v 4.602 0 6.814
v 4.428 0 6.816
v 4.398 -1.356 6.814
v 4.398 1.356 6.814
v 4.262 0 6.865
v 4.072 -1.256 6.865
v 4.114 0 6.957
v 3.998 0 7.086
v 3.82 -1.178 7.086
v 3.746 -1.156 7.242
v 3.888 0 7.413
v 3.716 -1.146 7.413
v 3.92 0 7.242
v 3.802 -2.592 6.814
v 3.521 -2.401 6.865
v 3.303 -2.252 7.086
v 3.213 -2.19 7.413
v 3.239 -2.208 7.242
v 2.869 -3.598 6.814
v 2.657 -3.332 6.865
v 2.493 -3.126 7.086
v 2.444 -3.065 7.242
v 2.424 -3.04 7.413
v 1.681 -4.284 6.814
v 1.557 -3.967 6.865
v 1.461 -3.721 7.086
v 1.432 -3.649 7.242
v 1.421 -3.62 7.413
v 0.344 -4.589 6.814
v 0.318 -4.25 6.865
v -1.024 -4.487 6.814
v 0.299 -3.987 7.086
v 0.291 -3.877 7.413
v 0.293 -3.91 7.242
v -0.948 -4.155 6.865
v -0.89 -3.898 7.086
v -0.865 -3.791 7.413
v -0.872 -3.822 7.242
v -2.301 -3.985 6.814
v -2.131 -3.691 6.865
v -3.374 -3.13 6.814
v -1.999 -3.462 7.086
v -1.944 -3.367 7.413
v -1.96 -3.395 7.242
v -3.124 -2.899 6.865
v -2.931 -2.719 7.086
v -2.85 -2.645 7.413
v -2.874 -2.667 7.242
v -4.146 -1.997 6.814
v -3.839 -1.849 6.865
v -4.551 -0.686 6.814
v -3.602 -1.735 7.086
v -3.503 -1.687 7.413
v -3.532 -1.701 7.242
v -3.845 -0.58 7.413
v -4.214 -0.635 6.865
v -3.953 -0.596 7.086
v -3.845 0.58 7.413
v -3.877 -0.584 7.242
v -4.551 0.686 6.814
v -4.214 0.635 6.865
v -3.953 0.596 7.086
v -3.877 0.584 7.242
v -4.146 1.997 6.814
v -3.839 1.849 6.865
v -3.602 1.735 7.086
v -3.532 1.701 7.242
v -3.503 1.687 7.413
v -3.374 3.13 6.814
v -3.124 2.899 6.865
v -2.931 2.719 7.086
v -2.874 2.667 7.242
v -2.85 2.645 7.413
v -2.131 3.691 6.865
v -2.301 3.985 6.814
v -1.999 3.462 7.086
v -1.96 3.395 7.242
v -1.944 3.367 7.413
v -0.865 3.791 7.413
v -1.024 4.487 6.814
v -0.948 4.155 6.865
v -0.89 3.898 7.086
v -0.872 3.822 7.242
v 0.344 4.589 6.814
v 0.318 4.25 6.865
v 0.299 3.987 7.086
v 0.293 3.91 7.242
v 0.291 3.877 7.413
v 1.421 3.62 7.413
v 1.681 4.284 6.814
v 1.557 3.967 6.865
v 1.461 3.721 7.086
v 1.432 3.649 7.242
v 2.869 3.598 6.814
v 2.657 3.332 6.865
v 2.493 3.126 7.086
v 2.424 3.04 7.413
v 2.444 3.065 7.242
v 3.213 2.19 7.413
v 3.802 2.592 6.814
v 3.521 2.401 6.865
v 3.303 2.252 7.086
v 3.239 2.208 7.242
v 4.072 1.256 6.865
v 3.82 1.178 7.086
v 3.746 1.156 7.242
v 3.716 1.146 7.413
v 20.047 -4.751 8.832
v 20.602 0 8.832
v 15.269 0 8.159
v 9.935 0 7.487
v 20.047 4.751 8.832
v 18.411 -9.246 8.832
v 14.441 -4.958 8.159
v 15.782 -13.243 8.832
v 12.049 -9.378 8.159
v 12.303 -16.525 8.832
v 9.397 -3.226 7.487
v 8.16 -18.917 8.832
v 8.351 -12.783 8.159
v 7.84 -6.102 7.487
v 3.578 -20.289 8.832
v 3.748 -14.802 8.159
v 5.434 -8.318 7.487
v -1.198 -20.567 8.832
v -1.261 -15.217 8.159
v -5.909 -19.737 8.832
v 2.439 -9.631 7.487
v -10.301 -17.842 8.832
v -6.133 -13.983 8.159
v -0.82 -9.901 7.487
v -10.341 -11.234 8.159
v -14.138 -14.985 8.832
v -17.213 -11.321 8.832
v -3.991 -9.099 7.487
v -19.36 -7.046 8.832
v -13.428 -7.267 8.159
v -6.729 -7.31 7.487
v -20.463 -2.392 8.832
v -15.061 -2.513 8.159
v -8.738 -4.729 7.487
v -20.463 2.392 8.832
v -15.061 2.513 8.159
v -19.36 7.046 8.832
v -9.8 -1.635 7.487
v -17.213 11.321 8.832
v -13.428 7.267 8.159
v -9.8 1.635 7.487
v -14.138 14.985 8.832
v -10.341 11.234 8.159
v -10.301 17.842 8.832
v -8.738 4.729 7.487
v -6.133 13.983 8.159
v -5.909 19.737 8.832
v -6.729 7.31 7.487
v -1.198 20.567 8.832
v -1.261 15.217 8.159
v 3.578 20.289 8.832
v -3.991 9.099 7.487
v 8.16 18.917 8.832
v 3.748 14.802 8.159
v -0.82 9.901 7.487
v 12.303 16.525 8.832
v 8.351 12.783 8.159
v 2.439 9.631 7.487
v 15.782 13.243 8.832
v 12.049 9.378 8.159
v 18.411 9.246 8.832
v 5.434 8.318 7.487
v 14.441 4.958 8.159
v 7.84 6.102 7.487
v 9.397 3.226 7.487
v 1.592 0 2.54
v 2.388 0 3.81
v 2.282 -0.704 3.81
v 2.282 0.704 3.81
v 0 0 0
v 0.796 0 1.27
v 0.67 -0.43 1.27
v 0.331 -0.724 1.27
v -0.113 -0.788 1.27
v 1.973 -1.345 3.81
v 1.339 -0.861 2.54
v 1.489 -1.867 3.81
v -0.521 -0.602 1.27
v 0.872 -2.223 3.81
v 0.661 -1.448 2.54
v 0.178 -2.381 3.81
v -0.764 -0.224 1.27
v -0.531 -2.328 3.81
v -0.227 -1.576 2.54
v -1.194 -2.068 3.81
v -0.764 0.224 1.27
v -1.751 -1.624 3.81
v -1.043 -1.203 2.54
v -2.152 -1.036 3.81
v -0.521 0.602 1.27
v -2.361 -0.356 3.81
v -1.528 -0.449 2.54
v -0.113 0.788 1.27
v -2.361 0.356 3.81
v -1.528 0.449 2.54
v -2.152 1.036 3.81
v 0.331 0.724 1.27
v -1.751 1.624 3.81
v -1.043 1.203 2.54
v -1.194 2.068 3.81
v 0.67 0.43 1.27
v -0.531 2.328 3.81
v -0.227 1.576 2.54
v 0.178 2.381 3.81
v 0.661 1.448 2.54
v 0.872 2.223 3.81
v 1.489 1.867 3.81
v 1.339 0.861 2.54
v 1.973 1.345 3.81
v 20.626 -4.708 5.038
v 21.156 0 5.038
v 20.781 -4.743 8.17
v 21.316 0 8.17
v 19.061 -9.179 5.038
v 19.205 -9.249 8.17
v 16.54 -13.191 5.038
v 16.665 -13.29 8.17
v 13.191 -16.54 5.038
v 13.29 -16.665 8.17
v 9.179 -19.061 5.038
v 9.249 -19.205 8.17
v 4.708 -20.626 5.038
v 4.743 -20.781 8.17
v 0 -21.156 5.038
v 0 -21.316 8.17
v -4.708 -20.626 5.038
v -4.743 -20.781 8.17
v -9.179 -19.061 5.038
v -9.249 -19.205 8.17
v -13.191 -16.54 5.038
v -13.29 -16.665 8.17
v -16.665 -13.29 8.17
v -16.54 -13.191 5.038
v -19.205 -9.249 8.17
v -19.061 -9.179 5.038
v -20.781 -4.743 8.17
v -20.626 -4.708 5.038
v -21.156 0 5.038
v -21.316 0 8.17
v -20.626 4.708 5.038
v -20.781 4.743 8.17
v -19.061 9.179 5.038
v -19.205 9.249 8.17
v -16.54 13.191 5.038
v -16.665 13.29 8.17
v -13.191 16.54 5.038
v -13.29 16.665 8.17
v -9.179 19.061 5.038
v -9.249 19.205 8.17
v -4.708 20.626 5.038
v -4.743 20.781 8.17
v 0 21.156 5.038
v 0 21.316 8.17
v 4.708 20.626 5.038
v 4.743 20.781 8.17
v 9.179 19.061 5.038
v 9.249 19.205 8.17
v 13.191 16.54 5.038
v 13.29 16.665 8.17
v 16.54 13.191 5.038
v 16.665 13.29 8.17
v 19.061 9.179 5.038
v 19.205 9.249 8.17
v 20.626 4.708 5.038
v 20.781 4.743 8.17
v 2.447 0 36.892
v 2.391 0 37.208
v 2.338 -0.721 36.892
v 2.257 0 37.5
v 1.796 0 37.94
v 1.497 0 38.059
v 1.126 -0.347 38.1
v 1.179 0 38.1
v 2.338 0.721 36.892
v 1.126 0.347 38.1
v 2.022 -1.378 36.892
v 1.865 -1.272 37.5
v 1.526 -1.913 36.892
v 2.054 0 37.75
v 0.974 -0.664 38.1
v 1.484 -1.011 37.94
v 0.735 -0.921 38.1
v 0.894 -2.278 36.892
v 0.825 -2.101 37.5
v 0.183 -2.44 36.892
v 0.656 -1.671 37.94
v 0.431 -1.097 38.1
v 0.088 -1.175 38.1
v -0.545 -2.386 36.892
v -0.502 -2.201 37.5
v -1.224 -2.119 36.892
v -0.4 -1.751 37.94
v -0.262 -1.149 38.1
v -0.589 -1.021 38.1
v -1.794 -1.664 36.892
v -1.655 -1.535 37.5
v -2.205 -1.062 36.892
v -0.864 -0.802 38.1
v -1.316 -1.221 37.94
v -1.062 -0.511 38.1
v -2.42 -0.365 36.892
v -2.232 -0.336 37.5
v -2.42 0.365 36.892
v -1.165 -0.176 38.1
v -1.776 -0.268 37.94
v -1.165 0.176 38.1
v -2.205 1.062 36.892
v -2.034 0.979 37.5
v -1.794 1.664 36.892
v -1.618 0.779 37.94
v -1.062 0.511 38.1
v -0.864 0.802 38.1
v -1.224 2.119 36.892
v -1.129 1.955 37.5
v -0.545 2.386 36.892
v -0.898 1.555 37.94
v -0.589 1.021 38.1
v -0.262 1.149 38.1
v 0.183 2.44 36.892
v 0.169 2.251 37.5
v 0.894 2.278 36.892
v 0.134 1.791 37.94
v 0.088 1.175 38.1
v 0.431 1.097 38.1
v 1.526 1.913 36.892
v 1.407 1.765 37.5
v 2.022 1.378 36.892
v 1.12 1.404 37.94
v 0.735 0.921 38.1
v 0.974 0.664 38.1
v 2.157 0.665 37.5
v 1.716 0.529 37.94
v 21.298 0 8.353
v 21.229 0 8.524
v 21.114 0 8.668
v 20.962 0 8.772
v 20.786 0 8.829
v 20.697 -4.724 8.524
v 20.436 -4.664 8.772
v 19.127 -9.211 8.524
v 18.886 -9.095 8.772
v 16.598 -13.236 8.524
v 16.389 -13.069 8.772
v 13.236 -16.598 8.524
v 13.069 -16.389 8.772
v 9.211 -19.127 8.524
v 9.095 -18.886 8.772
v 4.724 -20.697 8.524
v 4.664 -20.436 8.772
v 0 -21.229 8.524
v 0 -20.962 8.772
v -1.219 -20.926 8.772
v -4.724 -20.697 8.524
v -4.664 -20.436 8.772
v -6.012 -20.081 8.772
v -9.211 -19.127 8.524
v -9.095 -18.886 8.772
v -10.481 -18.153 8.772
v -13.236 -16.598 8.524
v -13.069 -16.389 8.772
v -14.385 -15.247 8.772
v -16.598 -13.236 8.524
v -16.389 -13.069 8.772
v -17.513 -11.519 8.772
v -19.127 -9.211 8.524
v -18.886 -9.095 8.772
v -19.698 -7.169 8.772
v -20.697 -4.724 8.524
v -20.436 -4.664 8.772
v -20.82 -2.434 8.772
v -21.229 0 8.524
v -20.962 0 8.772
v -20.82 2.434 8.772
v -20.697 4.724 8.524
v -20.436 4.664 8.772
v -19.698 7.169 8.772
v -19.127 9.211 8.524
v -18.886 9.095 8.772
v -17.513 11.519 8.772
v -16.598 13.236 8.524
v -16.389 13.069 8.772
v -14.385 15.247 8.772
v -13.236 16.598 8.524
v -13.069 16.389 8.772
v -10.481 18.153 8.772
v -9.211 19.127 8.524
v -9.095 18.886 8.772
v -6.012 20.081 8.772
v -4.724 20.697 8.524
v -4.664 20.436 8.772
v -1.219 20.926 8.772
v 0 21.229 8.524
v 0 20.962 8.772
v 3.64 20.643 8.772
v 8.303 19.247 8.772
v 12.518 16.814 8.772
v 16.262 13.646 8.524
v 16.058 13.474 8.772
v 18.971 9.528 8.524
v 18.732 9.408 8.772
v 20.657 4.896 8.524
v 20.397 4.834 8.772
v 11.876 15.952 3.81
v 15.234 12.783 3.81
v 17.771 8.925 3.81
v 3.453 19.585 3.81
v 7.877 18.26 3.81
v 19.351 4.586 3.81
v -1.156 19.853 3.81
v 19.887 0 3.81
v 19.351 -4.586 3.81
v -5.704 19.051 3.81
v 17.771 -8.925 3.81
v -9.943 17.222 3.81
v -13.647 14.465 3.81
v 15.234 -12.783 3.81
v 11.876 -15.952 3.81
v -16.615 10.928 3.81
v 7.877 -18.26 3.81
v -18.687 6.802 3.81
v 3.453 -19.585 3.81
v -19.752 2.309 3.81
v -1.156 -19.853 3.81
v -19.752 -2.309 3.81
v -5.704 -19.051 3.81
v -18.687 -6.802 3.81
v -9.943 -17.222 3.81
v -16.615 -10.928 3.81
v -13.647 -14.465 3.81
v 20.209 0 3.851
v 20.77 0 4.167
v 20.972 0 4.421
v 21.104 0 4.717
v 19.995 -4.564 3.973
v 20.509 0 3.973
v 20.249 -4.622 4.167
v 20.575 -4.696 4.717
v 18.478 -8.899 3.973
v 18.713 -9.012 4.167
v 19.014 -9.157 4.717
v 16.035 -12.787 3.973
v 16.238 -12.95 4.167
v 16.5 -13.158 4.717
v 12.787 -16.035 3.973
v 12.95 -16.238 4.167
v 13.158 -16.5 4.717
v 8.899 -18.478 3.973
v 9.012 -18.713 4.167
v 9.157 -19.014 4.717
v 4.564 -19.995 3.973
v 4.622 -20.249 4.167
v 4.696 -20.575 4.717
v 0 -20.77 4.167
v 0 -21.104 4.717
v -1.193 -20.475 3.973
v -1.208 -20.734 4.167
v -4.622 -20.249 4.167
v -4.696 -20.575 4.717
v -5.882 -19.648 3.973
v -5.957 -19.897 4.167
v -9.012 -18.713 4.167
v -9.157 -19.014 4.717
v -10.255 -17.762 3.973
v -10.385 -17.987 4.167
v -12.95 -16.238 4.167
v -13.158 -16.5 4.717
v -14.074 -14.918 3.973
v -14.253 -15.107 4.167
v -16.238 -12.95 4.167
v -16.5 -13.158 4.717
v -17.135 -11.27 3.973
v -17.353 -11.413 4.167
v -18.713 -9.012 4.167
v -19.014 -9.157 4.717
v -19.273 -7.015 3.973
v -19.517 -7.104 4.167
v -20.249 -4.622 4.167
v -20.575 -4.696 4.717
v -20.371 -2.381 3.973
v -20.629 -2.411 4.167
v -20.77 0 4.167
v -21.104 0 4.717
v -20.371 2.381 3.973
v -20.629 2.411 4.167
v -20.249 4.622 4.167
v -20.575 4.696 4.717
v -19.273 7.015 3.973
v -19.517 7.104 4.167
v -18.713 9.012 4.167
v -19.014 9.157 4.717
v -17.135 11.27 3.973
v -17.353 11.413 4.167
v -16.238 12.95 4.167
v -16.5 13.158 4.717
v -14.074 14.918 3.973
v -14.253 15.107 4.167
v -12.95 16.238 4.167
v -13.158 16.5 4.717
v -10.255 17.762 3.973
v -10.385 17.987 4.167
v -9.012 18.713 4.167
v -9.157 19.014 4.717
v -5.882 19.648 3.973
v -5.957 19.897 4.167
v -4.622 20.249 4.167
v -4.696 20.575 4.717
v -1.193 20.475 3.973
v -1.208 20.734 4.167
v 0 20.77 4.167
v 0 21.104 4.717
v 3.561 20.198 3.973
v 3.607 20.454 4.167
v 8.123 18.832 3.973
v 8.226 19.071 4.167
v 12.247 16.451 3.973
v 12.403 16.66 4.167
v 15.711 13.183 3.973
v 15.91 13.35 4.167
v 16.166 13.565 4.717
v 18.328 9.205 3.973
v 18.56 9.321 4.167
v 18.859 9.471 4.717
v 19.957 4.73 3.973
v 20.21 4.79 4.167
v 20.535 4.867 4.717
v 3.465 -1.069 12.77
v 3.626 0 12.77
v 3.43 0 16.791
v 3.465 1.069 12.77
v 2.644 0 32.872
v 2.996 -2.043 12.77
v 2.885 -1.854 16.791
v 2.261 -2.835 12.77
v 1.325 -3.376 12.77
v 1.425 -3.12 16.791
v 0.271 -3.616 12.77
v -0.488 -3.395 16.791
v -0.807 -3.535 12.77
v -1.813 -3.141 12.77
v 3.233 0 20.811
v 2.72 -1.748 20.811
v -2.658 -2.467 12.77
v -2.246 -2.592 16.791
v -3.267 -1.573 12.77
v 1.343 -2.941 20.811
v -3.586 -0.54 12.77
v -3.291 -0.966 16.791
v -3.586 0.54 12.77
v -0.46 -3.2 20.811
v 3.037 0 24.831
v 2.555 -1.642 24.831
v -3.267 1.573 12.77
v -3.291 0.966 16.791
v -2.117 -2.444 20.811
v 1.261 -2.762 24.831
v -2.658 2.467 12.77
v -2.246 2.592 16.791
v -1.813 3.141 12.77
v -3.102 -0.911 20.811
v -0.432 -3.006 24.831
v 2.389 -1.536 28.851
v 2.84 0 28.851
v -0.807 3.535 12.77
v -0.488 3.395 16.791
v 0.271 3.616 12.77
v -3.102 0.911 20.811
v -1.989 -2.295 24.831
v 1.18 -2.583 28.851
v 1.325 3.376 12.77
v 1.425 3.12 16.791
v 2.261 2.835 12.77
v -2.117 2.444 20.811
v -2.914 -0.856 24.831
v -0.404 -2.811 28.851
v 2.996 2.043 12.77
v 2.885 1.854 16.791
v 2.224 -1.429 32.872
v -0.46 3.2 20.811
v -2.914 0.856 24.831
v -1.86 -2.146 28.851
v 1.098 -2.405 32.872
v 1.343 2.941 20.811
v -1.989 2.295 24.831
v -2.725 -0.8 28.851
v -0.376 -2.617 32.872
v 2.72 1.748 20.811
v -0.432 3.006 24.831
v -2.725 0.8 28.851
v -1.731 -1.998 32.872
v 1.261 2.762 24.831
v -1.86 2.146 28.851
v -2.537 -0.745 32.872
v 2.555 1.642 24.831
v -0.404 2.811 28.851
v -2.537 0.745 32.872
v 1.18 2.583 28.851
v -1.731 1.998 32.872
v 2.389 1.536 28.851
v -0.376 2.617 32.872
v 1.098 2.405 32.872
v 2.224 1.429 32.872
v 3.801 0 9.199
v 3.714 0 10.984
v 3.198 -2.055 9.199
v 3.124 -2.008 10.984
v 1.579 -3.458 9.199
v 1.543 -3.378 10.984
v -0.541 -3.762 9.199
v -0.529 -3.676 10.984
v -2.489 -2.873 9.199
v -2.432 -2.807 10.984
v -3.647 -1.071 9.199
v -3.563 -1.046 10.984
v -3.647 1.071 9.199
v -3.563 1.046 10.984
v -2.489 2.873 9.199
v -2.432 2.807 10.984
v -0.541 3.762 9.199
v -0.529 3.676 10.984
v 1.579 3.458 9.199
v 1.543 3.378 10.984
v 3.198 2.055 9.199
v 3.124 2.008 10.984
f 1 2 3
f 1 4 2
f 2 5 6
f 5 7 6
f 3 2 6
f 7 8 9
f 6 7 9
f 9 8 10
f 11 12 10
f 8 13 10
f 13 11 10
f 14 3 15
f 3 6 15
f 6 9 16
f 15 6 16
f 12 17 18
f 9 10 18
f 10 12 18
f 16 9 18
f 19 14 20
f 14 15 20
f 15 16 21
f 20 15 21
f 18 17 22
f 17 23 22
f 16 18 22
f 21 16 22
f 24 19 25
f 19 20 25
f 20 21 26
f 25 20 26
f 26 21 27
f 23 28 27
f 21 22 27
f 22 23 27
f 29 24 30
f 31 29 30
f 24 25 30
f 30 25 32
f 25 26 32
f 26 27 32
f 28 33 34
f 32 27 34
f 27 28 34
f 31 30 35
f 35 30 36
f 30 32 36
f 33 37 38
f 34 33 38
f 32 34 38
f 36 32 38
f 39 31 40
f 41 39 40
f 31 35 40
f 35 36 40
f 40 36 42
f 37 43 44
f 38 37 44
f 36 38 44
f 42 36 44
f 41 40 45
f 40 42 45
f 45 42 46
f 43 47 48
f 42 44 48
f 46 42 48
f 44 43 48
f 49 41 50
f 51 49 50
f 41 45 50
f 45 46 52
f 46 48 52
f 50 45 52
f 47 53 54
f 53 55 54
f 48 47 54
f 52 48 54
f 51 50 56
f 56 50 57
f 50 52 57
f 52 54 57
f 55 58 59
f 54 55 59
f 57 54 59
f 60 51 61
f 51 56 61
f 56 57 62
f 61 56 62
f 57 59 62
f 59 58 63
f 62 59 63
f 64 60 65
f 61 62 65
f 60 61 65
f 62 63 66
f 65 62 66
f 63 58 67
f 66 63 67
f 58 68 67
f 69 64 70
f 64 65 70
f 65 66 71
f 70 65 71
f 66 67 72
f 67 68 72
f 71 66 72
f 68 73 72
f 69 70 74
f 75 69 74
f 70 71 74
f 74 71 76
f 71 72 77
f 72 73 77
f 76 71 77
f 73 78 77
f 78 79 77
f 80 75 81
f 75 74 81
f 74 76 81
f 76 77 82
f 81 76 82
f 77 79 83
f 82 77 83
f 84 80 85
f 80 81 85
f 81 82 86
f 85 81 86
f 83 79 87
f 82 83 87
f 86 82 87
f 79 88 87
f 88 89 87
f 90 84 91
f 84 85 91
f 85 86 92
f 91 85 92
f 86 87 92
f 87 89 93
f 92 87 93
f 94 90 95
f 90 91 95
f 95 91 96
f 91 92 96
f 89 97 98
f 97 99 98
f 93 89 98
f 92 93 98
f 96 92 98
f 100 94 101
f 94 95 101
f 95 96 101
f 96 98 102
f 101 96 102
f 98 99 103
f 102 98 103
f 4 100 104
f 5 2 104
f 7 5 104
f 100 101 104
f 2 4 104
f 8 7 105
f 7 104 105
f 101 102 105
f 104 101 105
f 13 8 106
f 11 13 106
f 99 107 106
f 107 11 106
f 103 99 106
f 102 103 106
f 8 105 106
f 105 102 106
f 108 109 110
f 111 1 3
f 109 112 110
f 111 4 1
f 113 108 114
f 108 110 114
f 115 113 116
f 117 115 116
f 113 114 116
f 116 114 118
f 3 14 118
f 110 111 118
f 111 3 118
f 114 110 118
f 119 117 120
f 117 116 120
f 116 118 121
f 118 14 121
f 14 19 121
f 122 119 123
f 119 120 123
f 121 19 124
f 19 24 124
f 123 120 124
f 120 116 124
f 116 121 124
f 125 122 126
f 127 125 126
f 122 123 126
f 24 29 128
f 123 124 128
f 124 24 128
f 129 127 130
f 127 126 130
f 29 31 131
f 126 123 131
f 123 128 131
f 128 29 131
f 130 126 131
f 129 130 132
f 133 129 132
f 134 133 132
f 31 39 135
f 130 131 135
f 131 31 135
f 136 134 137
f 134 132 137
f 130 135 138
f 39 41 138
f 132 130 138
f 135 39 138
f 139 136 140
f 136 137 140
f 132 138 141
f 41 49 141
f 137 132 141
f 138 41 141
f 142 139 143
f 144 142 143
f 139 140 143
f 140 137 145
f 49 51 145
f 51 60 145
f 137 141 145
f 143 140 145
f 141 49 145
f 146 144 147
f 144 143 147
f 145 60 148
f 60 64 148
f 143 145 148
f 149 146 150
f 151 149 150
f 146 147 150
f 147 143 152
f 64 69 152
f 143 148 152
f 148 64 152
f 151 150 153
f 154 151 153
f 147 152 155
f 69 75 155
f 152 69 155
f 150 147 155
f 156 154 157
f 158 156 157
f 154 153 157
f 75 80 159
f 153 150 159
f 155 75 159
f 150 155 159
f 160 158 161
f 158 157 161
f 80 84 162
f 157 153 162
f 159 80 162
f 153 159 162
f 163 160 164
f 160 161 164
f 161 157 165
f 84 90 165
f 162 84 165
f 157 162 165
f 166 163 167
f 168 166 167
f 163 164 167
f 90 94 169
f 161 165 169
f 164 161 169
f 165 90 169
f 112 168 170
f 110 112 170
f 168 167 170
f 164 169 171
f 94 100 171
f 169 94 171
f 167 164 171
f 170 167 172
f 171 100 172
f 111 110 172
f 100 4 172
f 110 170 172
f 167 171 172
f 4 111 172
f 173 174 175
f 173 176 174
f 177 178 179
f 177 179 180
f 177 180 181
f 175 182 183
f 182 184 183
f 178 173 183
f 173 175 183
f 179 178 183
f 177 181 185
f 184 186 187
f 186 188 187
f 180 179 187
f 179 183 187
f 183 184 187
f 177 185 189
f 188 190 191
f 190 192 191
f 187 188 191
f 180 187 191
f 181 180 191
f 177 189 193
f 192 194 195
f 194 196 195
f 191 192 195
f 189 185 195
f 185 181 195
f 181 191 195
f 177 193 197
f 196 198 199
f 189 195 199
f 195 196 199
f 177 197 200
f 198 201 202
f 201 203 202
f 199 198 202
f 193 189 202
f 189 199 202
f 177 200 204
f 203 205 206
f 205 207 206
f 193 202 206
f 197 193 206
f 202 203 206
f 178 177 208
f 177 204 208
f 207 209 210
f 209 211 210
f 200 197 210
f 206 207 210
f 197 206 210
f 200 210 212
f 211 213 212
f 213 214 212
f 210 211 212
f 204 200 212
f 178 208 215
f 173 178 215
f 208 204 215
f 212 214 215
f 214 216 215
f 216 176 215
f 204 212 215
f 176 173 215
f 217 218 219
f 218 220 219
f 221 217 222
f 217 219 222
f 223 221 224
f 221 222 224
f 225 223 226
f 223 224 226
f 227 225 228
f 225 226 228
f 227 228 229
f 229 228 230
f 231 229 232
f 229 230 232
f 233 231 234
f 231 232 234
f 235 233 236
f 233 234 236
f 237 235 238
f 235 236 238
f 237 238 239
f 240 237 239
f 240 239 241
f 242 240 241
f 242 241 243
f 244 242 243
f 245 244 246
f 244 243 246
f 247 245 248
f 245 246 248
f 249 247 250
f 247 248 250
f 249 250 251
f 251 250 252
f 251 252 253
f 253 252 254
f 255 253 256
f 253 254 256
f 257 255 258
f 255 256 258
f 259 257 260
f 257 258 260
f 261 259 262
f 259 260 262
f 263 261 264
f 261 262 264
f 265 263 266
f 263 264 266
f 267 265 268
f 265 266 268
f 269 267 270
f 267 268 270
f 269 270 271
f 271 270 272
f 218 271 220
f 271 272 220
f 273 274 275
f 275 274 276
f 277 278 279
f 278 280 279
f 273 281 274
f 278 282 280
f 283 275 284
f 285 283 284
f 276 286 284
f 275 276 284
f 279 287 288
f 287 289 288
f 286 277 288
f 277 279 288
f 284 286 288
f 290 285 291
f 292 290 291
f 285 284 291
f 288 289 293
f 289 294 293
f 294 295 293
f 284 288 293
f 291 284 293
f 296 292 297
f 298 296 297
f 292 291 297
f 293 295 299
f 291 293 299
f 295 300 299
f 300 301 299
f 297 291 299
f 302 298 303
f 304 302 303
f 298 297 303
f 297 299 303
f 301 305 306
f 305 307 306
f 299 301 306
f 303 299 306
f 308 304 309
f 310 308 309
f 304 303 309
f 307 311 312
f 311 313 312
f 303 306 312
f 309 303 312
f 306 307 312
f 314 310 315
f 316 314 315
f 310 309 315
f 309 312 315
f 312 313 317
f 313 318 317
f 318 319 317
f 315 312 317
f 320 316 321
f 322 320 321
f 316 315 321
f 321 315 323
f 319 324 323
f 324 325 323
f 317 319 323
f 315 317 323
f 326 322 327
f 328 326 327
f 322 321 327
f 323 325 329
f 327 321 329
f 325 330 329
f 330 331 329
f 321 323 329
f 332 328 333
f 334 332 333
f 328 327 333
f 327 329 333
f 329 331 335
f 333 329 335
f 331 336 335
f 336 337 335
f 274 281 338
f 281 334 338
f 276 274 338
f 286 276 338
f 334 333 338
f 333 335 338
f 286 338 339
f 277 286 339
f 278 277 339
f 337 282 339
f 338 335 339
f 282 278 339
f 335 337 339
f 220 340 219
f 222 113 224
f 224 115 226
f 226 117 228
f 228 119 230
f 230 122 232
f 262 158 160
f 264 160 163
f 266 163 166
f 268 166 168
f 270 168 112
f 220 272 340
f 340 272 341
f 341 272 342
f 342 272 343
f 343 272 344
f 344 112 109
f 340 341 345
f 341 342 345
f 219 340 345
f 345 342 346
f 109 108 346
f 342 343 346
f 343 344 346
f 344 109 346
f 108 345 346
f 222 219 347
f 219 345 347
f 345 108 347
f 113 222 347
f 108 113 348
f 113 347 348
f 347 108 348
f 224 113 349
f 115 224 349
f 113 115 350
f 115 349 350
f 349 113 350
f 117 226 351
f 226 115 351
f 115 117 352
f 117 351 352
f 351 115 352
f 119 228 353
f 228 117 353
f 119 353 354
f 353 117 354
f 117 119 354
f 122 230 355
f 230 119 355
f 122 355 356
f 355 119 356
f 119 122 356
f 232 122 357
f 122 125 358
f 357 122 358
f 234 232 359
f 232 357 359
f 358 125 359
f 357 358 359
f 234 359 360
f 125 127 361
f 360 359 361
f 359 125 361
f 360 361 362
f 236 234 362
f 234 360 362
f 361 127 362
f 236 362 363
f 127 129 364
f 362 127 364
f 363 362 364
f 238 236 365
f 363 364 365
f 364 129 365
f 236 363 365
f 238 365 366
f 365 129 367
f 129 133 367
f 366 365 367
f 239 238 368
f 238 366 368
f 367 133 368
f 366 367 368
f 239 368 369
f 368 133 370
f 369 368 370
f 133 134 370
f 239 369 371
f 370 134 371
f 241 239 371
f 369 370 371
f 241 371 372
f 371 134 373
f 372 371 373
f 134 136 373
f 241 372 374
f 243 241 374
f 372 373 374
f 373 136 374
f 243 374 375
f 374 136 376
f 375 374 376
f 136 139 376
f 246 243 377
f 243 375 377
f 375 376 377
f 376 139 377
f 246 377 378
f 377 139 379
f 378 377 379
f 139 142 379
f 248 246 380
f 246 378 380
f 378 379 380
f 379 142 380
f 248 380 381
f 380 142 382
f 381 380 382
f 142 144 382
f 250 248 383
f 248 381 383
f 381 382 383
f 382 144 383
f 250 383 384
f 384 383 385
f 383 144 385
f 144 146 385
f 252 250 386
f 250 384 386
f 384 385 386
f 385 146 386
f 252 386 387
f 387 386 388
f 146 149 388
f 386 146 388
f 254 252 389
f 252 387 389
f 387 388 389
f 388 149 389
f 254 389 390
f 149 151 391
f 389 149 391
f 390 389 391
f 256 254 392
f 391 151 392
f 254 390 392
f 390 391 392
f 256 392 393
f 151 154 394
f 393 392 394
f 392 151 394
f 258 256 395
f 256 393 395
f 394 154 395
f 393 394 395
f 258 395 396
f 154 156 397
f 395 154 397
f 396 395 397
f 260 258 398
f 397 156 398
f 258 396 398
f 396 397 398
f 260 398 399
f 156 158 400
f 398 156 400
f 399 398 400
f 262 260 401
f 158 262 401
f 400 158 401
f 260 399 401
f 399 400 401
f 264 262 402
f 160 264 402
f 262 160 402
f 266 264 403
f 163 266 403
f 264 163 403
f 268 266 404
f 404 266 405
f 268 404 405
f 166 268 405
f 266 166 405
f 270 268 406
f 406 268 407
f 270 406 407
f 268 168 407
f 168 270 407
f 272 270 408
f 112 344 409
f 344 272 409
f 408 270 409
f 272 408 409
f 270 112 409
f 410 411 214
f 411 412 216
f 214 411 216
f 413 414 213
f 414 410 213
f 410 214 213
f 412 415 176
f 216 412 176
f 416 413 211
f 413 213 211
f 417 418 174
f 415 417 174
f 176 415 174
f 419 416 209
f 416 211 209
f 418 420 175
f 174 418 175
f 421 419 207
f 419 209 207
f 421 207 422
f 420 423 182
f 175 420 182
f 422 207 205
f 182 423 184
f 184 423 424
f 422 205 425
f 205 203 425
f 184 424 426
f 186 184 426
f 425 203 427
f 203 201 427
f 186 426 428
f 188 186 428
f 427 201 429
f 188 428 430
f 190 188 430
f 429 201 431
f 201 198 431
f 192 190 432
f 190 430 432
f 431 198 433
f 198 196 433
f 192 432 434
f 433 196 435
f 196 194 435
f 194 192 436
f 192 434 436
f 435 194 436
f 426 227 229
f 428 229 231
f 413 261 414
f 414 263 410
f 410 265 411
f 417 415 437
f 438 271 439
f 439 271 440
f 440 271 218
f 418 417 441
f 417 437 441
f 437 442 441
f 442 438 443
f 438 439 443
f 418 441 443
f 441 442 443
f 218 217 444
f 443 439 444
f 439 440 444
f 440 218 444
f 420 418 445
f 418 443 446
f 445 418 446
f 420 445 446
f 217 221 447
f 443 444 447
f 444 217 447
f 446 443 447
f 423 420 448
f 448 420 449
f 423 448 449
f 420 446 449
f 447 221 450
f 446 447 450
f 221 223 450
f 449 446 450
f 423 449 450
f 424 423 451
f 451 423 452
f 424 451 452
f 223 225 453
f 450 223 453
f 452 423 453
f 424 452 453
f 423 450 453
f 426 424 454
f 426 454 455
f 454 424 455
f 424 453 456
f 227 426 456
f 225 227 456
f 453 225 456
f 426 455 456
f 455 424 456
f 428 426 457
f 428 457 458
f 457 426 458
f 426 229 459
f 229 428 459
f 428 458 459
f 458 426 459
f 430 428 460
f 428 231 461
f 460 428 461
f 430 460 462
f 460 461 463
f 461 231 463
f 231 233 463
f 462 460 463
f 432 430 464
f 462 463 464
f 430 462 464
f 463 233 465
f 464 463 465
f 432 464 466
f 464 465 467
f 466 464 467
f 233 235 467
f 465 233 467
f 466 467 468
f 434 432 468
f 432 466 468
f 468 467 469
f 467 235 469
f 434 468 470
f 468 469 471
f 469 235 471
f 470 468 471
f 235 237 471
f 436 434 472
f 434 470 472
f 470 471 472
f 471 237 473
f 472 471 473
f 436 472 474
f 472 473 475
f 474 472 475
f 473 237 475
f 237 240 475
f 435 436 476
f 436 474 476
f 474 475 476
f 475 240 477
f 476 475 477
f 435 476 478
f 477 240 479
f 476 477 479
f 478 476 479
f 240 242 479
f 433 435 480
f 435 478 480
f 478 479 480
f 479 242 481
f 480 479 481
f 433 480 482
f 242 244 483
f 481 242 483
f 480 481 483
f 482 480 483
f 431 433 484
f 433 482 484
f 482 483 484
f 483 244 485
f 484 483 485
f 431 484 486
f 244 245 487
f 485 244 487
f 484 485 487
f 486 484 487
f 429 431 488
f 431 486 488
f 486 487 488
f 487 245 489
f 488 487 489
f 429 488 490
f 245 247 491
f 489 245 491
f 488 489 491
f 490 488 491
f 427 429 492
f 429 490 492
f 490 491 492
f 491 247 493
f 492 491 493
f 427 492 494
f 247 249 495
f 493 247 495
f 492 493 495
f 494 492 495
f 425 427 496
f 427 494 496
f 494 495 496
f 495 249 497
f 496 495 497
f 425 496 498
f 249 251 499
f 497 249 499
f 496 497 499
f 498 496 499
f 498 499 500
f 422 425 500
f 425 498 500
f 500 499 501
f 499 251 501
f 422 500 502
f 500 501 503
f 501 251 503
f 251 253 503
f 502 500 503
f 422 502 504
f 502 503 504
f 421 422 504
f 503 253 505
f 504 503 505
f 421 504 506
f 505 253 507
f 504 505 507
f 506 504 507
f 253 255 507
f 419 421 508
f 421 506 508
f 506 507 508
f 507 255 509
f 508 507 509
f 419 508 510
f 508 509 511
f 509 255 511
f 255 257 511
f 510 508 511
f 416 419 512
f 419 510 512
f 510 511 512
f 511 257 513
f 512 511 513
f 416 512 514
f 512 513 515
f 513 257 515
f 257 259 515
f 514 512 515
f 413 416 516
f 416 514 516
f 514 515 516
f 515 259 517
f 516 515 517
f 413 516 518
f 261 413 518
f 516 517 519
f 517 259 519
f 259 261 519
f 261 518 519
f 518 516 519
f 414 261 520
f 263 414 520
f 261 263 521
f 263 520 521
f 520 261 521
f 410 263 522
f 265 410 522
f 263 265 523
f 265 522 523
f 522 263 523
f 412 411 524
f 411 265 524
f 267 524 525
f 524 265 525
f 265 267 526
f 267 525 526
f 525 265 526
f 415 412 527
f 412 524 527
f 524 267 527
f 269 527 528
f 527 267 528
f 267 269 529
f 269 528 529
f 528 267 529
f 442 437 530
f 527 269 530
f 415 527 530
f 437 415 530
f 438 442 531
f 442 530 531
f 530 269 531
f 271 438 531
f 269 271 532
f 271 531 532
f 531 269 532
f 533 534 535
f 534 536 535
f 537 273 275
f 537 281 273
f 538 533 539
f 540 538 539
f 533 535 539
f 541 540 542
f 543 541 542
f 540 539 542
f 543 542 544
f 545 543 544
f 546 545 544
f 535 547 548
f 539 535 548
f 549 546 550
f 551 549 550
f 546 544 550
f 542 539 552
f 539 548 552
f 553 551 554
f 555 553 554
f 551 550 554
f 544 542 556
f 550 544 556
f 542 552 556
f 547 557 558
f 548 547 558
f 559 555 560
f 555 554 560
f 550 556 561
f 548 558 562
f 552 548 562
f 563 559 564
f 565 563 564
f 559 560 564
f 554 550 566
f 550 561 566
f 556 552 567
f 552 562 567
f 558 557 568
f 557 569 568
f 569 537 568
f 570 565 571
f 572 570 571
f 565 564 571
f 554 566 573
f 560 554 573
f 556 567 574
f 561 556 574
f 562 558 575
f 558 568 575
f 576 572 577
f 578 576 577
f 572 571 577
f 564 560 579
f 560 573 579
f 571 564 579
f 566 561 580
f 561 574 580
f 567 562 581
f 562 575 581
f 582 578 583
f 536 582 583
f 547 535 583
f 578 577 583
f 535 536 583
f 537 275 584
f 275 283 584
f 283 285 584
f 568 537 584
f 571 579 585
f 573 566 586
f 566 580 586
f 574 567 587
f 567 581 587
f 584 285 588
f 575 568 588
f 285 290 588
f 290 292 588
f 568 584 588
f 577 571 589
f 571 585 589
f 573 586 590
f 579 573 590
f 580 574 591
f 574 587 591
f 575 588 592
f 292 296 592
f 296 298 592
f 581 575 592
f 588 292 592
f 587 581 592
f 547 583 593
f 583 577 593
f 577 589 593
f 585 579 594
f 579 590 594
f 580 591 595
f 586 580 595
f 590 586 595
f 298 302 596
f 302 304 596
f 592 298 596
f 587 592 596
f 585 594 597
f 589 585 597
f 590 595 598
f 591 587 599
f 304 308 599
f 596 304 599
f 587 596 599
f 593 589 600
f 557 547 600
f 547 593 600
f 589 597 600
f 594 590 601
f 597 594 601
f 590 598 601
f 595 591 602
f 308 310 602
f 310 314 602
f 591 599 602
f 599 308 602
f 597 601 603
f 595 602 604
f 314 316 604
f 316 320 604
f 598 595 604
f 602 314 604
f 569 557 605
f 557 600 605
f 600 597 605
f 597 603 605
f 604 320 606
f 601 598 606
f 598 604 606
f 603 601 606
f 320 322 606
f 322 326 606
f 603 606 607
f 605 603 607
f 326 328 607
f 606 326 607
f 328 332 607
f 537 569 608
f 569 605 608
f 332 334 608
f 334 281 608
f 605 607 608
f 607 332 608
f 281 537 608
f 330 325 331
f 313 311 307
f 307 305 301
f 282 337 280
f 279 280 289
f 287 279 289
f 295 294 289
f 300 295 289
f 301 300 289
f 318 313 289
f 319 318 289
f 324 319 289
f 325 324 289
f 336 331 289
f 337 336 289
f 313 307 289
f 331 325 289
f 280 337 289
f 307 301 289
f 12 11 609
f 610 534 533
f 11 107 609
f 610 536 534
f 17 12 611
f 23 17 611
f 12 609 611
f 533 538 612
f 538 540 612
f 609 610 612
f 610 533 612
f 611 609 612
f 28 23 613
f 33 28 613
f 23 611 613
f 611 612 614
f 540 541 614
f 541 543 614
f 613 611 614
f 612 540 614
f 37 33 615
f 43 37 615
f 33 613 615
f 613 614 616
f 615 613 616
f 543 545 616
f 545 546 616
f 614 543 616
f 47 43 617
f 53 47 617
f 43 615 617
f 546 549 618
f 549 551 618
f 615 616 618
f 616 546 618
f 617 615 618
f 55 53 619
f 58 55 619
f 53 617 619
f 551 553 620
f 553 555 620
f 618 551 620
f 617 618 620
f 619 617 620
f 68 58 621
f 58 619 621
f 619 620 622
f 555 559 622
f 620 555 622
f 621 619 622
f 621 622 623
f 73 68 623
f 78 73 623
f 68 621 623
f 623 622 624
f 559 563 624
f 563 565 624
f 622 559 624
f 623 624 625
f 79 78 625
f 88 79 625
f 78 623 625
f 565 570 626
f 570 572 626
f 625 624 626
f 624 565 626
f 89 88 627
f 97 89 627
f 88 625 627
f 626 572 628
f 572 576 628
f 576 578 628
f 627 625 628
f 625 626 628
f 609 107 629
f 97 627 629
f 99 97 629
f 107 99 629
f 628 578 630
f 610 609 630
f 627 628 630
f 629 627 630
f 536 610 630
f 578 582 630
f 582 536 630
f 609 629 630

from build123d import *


with BuildPart() as f1:
    # F0 (on Front) → F1 (revolve)
    with BuildSketch(Plane.XZ):
        with BuildLine():
            Line((1.178567, 38.1), (0, 38.1))
            Line((0, 38.1), (0, 0))
            Line((0, 0), (2.387992, 3.81))
            Line((2.387992, 3.81), (19.88674, 3.81))
            ThreePointArc((19.88674, 3.81), (20.769638, 4.167097), (21.156031, 5.037571))
            Line((21.156031, 5.037571), (21.315811, 8.169891))
            ThreePointArc((21.315811, 8.169891), (21.113608, 8.66767), (20.602155, 8.832246))
            Line((20.602155, 8.832246), (4.602036, 6.813674))
            ThreePointArc((4.602036, 6.813674), (4.11434, 6.95728), (3.888313, 7.412672))
            Line((3.888313, 7.412672), (3.626376, 12.770278))
            Line((3.626376, 12.770278), (2.447051, 36.892017))
            ThreePointArc((2.447051, 36.892017), (2.054391, 37.749691), (1.178567, 38.1))
        make_face()
    revolve(axis=Axis((0, 0, 19.05), (0, 0, -1)))


solid = f1.part
